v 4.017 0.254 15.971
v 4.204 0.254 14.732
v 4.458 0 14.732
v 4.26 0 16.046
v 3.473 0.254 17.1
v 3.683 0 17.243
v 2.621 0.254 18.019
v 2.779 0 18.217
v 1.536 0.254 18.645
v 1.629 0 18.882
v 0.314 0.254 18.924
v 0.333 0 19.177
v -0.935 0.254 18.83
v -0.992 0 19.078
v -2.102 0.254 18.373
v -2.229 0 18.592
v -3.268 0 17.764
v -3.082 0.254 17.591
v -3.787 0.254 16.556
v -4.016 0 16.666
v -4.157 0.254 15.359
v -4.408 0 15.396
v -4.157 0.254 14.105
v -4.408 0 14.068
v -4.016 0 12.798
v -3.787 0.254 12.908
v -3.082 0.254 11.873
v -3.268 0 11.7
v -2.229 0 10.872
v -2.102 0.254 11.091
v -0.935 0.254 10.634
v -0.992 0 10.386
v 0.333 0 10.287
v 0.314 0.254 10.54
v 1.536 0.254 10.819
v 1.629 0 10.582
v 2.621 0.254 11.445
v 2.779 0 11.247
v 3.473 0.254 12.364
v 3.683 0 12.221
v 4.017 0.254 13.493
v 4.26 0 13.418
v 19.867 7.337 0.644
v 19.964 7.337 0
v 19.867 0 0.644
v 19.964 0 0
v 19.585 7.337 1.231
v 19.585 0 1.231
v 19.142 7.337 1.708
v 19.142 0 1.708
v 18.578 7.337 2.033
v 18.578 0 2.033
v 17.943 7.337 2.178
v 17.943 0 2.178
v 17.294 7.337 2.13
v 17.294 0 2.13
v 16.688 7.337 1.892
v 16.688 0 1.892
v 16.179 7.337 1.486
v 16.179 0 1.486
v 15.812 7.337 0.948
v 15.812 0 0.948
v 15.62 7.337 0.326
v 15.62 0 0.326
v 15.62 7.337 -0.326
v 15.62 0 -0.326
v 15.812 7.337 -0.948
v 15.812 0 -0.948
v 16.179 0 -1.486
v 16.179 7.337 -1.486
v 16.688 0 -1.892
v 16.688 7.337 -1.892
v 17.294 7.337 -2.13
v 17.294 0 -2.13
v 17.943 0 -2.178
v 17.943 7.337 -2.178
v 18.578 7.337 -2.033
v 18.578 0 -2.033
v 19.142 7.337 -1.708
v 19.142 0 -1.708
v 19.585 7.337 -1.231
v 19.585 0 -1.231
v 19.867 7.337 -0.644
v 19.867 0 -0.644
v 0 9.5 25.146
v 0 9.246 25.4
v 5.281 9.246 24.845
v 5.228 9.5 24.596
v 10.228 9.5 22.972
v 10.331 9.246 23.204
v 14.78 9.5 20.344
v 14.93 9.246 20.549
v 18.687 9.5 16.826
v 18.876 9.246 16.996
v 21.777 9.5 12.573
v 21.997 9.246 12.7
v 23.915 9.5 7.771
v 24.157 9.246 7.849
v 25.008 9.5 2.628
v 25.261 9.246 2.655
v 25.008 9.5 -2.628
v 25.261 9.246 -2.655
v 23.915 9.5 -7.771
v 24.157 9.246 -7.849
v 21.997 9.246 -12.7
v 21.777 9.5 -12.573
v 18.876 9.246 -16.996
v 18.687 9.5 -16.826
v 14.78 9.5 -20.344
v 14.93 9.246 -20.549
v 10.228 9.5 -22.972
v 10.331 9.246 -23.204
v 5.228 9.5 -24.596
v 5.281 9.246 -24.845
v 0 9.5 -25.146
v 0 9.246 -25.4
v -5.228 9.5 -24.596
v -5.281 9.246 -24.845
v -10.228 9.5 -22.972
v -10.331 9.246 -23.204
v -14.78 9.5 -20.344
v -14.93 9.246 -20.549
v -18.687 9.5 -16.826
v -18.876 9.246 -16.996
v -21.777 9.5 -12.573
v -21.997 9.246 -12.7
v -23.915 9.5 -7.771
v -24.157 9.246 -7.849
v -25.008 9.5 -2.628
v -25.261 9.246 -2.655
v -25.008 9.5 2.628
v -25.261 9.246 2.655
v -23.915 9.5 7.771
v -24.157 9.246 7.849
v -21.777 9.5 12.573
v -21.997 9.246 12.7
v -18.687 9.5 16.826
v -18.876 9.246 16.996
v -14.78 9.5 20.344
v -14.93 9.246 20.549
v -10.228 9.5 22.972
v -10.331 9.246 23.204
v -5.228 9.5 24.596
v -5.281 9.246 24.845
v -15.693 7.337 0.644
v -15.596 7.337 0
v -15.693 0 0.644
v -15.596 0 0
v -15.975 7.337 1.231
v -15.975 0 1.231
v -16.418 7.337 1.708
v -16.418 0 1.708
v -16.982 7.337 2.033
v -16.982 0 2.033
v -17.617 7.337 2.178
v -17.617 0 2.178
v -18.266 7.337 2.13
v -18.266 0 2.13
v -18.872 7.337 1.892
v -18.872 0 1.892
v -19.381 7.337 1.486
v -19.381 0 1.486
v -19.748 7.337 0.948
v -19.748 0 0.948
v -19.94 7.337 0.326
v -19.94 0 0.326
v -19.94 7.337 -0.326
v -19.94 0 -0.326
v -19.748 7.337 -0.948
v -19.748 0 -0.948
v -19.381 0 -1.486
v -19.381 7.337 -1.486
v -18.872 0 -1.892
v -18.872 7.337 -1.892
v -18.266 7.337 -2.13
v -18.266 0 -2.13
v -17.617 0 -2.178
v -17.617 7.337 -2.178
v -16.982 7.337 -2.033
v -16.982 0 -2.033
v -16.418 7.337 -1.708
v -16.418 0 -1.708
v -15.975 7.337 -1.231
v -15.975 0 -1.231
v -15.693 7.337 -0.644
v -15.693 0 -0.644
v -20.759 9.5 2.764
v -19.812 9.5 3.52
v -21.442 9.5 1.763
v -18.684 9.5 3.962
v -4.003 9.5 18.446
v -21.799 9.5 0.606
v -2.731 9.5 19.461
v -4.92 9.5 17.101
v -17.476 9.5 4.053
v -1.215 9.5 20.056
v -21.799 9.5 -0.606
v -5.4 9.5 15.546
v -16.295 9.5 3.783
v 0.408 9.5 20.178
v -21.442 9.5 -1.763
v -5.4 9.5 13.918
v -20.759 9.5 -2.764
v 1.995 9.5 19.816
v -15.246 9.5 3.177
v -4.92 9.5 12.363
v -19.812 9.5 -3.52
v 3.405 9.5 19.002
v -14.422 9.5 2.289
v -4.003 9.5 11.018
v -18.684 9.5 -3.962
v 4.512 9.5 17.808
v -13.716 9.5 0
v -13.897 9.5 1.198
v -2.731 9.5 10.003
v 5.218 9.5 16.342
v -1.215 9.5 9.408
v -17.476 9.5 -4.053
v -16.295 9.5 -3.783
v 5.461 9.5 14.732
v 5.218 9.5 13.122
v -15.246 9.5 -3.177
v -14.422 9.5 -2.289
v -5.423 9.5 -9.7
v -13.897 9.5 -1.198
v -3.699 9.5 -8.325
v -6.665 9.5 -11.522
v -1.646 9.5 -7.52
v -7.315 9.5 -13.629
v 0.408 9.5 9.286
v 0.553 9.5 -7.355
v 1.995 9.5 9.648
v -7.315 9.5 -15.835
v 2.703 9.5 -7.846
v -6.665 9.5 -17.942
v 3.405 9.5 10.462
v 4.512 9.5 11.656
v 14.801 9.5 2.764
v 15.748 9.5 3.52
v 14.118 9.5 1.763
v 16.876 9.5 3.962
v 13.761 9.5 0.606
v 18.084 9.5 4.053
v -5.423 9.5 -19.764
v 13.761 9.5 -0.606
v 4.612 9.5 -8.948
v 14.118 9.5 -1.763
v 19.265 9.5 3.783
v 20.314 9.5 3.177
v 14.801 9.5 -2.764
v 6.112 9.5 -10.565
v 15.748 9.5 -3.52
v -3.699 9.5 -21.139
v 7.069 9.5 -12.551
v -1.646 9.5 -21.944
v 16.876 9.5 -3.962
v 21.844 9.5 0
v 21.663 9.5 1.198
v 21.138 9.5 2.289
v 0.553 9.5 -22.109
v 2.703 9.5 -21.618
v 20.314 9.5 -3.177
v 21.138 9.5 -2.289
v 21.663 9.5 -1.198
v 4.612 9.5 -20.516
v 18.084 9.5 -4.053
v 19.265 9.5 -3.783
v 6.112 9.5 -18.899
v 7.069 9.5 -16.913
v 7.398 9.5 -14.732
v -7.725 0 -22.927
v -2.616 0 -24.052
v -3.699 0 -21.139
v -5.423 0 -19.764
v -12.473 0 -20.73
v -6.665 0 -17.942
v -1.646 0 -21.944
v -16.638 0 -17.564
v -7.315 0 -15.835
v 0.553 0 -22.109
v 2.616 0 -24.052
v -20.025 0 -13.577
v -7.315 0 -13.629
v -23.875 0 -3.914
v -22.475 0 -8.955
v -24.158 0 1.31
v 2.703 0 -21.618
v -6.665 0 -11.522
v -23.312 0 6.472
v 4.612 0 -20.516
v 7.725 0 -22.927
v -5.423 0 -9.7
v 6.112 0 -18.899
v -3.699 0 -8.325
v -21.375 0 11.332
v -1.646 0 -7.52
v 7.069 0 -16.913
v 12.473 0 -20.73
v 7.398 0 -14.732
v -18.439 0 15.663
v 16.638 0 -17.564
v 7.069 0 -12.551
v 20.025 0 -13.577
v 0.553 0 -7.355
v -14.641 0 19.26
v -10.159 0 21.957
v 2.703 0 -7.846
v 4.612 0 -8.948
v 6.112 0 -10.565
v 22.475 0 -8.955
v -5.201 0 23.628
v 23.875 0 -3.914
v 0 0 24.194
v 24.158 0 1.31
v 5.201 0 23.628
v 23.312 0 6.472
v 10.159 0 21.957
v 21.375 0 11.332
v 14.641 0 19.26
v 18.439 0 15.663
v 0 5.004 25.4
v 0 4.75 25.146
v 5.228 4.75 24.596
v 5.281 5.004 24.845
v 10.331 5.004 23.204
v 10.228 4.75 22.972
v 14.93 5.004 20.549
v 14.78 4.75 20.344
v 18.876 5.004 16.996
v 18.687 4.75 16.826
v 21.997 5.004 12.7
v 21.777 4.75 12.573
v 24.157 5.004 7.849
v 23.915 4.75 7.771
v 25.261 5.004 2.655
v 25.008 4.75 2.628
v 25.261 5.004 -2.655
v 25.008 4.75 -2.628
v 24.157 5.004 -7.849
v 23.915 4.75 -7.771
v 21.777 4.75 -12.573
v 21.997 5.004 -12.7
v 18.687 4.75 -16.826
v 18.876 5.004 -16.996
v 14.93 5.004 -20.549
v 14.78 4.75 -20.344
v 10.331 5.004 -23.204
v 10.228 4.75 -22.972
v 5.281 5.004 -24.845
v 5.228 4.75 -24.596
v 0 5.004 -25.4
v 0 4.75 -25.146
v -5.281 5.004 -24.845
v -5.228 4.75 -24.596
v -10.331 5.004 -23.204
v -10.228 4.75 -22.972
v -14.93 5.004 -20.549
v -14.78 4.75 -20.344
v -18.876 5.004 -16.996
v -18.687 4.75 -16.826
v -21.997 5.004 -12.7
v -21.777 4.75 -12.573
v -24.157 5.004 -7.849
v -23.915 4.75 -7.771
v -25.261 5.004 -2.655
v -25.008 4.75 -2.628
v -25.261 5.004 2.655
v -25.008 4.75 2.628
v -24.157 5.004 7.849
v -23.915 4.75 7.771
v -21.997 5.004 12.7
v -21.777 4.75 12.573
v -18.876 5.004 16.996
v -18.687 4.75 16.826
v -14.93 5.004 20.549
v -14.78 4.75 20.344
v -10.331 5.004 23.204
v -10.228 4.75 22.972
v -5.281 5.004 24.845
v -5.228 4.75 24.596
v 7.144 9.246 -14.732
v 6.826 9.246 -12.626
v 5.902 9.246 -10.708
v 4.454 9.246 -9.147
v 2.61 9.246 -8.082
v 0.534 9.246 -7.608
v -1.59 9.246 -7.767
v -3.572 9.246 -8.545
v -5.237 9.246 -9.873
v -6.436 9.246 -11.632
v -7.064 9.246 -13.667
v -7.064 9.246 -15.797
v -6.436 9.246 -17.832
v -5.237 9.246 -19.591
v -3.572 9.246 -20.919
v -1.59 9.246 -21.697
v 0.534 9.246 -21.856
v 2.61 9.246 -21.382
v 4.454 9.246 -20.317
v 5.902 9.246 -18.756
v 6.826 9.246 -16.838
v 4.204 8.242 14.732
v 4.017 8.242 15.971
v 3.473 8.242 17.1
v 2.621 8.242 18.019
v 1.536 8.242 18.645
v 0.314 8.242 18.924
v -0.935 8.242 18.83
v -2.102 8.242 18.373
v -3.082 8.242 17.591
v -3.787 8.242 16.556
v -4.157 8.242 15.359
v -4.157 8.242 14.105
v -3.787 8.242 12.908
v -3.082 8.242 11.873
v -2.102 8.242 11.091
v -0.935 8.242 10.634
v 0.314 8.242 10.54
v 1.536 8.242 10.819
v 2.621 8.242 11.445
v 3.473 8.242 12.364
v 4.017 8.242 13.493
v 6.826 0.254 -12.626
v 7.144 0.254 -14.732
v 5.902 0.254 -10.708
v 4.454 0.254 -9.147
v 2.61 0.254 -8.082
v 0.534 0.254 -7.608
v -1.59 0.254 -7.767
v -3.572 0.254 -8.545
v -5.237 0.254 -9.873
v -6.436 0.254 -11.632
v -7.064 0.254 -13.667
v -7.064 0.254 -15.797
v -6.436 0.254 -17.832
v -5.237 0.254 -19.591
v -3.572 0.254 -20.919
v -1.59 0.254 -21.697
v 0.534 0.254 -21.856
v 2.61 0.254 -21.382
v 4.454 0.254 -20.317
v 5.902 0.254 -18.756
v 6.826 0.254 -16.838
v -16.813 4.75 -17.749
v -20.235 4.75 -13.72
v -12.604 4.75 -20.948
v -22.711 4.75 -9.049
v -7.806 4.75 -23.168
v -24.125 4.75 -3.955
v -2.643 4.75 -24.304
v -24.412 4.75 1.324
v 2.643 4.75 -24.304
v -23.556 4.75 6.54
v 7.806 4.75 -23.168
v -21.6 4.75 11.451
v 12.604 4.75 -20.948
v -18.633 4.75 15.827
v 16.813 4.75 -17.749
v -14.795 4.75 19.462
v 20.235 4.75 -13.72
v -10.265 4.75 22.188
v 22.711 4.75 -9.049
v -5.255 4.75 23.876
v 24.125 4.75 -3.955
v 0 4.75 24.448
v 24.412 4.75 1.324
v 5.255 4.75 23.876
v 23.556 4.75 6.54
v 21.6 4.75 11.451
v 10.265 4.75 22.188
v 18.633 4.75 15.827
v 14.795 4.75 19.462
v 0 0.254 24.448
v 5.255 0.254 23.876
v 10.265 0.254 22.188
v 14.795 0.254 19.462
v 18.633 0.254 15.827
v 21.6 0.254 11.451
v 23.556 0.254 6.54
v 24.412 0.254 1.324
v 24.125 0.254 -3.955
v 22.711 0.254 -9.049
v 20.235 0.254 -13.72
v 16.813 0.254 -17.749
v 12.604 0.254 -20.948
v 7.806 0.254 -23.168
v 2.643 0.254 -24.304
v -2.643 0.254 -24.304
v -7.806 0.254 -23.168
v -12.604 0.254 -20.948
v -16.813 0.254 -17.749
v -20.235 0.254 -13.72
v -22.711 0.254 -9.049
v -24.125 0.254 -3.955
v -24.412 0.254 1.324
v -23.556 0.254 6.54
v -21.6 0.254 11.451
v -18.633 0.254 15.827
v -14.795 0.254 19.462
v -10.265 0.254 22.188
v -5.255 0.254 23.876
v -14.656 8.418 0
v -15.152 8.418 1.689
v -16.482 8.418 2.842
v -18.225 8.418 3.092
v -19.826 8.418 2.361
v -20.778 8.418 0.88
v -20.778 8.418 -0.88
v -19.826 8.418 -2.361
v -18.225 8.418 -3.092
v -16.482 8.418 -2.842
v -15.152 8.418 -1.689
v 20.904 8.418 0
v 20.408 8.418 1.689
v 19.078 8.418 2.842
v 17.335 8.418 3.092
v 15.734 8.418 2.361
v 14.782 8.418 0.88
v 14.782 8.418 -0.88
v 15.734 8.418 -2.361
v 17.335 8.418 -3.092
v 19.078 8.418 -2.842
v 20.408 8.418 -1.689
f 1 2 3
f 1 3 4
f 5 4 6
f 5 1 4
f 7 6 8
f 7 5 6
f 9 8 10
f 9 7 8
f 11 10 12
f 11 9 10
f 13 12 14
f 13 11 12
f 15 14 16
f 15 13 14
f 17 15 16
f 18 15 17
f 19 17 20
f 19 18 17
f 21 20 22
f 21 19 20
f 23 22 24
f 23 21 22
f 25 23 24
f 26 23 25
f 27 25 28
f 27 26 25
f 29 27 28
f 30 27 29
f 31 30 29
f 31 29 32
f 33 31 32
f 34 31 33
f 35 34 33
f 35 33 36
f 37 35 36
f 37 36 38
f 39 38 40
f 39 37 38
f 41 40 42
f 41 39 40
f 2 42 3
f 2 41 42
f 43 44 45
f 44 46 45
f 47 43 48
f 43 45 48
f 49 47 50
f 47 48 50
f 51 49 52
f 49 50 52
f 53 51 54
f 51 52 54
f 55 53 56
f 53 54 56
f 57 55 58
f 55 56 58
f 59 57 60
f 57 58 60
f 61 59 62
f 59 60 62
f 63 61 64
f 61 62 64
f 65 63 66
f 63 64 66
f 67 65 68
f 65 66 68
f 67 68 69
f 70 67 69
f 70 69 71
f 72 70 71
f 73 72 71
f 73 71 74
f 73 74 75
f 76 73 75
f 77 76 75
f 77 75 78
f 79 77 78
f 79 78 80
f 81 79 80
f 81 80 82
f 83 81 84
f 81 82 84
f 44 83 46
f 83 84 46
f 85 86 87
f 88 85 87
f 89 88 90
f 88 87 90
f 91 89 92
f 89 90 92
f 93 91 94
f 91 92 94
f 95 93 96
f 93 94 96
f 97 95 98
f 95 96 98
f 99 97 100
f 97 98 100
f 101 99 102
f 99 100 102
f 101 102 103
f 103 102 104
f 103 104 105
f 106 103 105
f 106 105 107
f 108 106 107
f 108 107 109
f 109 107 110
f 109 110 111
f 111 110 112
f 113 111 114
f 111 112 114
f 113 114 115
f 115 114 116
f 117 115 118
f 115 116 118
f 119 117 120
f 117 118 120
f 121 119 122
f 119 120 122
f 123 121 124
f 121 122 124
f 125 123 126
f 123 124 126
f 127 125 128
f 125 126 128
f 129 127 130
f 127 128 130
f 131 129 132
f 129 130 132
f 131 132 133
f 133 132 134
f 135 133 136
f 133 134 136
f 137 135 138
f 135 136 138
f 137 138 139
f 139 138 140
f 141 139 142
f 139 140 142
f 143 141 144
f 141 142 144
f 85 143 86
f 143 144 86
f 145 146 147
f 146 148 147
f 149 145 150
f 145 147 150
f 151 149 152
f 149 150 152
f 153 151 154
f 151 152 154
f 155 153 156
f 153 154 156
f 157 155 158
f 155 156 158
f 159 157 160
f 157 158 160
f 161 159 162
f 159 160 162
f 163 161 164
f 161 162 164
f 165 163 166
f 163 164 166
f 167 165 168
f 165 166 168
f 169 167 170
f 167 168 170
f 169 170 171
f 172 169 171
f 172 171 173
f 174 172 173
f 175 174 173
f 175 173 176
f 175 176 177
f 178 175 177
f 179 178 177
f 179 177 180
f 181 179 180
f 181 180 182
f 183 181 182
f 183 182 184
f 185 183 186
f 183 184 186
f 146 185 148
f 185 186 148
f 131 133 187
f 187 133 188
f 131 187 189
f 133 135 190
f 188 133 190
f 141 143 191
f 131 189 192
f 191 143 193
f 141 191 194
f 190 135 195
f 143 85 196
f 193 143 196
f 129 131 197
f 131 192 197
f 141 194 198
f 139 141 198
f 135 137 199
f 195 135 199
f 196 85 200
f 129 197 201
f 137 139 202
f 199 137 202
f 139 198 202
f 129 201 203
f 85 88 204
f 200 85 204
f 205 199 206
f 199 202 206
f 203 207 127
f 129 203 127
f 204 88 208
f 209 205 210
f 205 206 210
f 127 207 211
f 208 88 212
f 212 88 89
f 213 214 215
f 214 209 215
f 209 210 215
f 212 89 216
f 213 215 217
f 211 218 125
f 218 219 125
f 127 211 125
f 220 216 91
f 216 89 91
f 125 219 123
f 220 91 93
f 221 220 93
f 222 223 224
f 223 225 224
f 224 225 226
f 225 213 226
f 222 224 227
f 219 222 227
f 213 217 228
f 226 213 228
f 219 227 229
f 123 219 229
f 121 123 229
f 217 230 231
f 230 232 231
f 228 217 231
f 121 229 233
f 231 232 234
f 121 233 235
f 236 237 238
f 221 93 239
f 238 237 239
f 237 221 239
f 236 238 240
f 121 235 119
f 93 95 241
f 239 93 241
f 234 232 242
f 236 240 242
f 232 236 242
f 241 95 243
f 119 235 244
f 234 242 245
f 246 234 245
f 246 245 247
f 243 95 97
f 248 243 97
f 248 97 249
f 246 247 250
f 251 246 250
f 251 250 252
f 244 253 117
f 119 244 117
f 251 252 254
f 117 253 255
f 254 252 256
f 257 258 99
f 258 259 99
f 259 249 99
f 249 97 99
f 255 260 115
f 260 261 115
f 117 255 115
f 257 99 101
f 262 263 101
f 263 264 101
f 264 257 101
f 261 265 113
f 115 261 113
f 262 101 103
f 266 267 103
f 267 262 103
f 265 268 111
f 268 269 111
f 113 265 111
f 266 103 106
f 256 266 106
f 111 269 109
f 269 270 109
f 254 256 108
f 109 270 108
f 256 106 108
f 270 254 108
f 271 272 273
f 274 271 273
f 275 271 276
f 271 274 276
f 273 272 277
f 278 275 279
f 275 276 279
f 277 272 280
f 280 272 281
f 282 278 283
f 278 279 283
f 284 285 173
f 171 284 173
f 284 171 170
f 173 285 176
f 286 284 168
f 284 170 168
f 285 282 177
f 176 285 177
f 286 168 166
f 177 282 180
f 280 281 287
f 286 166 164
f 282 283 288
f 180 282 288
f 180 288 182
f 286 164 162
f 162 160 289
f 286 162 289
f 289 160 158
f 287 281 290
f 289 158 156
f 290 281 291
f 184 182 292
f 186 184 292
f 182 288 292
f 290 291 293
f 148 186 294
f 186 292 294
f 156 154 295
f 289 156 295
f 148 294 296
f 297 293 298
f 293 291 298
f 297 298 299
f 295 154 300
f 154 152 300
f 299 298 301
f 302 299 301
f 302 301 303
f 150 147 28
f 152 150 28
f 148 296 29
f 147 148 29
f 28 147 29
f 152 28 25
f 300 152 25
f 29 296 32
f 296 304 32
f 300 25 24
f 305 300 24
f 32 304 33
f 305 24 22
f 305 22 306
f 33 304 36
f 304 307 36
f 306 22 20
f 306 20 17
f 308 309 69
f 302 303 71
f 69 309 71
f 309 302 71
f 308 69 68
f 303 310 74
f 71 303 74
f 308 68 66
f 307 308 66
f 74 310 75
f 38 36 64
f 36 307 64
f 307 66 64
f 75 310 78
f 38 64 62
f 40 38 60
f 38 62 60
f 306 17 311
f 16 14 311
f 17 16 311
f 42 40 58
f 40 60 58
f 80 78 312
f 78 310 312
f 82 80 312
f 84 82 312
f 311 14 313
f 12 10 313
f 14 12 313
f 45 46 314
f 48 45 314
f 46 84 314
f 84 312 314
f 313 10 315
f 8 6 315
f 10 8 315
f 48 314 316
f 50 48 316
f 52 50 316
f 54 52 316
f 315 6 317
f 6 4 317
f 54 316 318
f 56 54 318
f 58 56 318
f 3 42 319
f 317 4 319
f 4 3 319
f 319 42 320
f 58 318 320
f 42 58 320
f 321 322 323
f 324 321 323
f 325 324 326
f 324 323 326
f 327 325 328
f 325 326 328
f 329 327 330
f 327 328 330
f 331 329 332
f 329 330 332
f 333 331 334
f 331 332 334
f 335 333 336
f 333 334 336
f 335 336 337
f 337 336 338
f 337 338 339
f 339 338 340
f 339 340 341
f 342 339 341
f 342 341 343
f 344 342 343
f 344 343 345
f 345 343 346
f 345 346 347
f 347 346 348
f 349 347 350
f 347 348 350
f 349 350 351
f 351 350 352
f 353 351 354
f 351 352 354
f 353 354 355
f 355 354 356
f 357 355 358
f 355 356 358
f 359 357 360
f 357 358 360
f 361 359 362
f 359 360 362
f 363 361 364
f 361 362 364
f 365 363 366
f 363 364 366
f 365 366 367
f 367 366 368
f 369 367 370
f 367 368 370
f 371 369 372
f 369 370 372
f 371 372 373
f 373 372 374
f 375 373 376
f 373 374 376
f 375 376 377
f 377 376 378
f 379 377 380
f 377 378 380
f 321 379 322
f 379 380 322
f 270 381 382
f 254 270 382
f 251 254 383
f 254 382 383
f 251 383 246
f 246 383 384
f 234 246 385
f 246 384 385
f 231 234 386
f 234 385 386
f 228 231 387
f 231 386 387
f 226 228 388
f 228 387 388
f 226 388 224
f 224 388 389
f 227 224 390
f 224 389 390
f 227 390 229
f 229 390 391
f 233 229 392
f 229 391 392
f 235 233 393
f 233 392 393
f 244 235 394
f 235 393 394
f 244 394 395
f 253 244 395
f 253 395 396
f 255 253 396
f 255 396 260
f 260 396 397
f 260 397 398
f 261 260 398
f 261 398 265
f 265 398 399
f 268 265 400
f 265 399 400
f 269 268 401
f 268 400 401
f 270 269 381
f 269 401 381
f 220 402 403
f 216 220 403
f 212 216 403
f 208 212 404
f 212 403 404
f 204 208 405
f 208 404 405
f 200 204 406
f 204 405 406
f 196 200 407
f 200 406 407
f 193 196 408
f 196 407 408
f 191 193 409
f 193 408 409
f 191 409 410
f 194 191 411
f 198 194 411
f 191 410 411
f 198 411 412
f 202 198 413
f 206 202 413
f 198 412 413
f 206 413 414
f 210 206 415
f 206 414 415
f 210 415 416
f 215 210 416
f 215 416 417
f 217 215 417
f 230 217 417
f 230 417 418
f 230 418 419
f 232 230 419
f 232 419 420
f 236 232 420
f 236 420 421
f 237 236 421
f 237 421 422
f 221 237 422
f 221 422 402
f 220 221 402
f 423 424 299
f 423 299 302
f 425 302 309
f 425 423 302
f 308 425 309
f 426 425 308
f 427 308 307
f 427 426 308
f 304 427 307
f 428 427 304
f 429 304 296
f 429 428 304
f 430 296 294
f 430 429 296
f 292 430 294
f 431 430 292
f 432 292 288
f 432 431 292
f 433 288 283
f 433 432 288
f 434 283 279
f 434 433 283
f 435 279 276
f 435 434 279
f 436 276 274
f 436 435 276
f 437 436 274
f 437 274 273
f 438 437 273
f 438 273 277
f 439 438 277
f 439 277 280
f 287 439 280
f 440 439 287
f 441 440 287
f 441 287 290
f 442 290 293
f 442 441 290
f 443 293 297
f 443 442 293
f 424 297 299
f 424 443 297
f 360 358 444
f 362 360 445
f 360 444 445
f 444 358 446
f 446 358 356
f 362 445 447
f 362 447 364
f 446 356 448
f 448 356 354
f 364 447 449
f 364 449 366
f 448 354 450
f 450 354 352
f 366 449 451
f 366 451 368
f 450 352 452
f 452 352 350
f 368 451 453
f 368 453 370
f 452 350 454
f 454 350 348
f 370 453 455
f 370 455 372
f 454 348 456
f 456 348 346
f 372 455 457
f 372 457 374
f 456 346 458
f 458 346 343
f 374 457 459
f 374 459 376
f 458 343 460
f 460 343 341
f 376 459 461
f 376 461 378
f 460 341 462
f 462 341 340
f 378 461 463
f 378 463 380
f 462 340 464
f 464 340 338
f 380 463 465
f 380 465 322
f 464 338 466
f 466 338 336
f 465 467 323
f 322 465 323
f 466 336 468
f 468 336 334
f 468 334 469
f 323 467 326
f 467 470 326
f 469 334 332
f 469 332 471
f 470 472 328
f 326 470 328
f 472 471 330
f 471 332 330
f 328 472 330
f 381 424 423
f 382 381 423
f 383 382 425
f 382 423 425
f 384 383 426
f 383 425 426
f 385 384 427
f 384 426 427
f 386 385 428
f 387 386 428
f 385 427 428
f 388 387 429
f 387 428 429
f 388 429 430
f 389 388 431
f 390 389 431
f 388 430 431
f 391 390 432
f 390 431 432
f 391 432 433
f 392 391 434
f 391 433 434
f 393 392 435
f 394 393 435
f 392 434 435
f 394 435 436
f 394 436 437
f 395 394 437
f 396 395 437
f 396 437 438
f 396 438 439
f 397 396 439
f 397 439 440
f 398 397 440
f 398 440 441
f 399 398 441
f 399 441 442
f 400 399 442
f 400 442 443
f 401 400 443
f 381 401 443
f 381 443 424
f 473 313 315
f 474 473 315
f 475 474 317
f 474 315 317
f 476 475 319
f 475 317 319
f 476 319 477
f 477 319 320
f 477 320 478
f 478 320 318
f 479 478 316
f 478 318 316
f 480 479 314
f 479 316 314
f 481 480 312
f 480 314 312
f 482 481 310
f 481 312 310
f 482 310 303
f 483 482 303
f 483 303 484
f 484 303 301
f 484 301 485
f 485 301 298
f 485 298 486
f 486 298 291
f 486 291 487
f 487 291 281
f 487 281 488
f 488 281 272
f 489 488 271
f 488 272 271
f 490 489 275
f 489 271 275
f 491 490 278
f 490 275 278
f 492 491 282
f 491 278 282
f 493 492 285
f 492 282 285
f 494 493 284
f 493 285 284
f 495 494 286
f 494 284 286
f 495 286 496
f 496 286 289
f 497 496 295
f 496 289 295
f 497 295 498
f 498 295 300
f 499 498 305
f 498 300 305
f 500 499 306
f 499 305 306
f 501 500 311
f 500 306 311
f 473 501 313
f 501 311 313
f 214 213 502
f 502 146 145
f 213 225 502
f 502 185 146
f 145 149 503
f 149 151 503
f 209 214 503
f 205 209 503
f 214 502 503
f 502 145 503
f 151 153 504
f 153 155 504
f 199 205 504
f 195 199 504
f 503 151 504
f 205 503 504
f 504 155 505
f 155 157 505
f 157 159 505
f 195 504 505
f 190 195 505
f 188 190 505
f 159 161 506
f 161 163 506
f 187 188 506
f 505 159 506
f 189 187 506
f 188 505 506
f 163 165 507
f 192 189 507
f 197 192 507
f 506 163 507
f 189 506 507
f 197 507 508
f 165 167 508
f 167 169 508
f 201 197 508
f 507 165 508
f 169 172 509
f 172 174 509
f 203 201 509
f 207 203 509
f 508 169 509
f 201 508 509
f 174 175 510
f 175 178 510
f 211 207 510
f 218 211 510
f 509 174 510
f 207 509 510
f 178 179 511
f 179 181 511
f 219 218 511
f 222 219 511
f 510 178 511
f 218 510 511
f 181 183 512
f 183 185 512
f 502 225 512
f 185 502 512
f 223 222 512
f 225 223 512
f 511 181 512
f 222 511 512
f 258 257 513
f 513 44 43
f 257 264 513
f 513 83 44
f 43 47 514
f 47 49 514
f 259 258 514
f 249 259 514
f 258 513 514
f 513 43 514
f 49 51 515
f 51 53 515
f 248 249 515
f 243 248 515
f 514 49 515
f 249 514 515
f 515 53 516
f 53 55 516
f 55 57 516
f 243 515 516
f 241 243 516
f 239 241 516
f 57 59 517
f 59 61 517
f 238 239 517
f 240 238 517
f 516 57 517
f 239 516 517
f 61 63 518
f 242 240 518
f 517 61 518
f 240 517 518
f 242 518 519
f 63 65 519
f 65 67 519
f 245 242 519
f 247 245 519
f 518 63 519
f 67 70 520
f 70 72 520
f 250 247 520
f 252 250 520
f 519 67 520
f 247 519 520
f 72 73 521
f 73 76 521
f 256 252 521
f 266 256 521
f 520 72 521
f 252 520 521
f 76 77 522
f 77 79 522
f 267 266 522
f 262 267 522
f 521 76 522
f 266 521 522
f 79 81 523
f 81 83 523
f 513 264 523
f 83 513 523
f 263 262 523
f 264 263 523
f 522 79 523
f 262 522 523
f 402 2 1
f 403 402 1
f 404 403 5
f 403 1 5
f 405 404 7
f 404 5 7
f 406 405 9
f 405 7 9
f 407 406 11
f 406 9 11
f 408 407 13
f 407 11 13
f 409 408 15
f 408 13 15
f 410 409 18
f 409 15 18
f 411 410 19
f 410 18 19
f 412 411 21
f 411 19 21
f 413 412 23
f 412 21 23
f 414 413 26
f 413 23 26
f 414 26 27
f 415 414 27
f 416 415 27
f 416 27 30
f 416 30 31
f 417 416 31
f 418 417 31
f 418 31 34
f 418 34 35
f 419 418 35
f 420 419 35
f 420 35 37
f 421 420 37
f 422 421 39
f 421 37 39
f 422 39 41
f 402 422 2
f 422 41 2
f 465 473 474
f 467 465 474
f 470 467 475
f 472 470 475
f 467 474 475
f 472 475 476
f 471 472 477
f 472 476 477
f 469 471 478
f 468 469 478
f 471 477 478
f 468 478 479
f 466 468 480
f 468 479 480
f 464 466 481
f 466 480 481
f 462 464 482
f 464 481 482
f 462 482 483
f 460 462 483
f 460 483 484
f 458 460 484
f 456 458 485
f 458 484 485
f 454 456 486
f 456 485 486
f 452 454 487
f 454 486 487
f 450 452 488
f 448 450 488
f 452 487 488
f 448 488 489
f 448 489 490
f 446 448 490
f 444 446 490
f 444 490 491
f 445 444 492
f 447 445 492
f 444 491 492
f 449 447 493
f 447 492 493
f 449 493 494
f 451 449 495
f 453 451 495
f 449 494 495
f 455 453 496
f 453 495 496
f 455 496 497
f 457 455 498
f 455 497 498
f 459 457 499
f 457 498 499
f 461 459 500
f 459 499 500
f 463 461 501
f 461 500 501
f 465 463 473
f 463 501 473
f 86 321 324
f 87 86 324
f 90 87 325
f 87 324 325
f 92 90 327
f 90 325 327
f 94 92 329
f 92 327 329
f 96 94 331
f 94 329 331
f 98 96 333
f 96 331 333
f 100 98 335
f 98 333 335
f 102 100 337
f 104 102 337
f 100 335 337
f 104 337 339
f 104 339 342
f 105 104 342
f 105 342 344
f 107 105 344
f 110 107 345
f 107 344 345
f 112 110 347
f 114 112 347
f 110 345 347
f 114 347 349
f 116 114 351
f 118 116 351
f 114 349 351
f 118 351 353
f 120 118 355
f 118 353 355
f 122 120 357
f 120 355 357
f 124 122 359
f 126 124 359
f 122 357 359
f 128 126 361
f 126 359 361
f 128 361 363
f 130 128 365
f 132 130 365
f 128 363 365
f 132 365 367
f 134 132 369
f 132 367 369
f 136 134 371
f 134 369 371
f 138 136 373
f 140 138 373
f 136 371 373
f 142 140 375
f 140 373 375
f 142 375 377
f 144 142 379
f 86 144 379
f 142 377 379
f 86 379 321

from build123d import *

# Parameters (mm, degrees)
F3_D           = 14.2875
F4_D           = 8.4074
F4_CSINK_D     = 10.922
F4_CSINK_ANGLE = 90
F5_D           = 4.3688
F5_CSINK_D     = 8.128
F5_CSINK_ANGLE = 82
F6_SIZE2       = 0.254
F6_SIZE        = 0.254


with BuildPart() as f1:
    # F0 (on Right) → F1 (revolve)
    with BuildSketch(Plane.YZ):
        Polygon((4.7498, 24.4475), (0, 24.4475), (0, 0), (9.4996, 0), (9.4996, 25.4), (4.7498, 25.4), align=None)
    revolve(axis=Axis((0, 5.1186173223, 0), (0, 1, 0)))

    # F3 (through all)
    with Locations(Plane(origin=(0, 9.4996, 0), x_dir=(-1, 0, 0), z_dir=(0, 1, 0))):
        with Locations((0, -14.732)):
            Hole(F3_D / 2)

    # F4 (through all)
    with Locations(Plane(origin=(0, 9.4996, 0), x_dir=(-1, 0, 0), z_dir=(0, 1, 0))):
        with Locations((0, 14.732)):
            CounterSinkHole(F4_D / 2, F4_CSINK_D / 2, counter_sink_angle=F4_CSINK_ANGLE)

    # F5 (through all)
    with Locations(Plane(origin=(0, 9.4996, 0), x_dir=(-1, 0, 0), z_dir=(0, 1, 0))):
        with Locations((-17.78, 0), (17.78, 0)):
            CounterSinkHole(F5_D / 2, F5_CSINK_D / 2, counter_sink_angle=F5_CSINK_ANGLE)

    # F6
    f6_edges = [f1.edges().sort_by_distance(p)[0] for p in [
        (0, 9.4996, -25.4),
        (0, 0, -24.4475),
        (0, 4.7498, -25.4),
        (7.14375, 0, -14.732),
        (4.2037, 0, 14.732),
        (7.14375, 9.4996, -14.732),
    ]]
    chamfer(f6_edges, length=F6_SIZE, length2=F6_SIZE2)


solid = f1.part
